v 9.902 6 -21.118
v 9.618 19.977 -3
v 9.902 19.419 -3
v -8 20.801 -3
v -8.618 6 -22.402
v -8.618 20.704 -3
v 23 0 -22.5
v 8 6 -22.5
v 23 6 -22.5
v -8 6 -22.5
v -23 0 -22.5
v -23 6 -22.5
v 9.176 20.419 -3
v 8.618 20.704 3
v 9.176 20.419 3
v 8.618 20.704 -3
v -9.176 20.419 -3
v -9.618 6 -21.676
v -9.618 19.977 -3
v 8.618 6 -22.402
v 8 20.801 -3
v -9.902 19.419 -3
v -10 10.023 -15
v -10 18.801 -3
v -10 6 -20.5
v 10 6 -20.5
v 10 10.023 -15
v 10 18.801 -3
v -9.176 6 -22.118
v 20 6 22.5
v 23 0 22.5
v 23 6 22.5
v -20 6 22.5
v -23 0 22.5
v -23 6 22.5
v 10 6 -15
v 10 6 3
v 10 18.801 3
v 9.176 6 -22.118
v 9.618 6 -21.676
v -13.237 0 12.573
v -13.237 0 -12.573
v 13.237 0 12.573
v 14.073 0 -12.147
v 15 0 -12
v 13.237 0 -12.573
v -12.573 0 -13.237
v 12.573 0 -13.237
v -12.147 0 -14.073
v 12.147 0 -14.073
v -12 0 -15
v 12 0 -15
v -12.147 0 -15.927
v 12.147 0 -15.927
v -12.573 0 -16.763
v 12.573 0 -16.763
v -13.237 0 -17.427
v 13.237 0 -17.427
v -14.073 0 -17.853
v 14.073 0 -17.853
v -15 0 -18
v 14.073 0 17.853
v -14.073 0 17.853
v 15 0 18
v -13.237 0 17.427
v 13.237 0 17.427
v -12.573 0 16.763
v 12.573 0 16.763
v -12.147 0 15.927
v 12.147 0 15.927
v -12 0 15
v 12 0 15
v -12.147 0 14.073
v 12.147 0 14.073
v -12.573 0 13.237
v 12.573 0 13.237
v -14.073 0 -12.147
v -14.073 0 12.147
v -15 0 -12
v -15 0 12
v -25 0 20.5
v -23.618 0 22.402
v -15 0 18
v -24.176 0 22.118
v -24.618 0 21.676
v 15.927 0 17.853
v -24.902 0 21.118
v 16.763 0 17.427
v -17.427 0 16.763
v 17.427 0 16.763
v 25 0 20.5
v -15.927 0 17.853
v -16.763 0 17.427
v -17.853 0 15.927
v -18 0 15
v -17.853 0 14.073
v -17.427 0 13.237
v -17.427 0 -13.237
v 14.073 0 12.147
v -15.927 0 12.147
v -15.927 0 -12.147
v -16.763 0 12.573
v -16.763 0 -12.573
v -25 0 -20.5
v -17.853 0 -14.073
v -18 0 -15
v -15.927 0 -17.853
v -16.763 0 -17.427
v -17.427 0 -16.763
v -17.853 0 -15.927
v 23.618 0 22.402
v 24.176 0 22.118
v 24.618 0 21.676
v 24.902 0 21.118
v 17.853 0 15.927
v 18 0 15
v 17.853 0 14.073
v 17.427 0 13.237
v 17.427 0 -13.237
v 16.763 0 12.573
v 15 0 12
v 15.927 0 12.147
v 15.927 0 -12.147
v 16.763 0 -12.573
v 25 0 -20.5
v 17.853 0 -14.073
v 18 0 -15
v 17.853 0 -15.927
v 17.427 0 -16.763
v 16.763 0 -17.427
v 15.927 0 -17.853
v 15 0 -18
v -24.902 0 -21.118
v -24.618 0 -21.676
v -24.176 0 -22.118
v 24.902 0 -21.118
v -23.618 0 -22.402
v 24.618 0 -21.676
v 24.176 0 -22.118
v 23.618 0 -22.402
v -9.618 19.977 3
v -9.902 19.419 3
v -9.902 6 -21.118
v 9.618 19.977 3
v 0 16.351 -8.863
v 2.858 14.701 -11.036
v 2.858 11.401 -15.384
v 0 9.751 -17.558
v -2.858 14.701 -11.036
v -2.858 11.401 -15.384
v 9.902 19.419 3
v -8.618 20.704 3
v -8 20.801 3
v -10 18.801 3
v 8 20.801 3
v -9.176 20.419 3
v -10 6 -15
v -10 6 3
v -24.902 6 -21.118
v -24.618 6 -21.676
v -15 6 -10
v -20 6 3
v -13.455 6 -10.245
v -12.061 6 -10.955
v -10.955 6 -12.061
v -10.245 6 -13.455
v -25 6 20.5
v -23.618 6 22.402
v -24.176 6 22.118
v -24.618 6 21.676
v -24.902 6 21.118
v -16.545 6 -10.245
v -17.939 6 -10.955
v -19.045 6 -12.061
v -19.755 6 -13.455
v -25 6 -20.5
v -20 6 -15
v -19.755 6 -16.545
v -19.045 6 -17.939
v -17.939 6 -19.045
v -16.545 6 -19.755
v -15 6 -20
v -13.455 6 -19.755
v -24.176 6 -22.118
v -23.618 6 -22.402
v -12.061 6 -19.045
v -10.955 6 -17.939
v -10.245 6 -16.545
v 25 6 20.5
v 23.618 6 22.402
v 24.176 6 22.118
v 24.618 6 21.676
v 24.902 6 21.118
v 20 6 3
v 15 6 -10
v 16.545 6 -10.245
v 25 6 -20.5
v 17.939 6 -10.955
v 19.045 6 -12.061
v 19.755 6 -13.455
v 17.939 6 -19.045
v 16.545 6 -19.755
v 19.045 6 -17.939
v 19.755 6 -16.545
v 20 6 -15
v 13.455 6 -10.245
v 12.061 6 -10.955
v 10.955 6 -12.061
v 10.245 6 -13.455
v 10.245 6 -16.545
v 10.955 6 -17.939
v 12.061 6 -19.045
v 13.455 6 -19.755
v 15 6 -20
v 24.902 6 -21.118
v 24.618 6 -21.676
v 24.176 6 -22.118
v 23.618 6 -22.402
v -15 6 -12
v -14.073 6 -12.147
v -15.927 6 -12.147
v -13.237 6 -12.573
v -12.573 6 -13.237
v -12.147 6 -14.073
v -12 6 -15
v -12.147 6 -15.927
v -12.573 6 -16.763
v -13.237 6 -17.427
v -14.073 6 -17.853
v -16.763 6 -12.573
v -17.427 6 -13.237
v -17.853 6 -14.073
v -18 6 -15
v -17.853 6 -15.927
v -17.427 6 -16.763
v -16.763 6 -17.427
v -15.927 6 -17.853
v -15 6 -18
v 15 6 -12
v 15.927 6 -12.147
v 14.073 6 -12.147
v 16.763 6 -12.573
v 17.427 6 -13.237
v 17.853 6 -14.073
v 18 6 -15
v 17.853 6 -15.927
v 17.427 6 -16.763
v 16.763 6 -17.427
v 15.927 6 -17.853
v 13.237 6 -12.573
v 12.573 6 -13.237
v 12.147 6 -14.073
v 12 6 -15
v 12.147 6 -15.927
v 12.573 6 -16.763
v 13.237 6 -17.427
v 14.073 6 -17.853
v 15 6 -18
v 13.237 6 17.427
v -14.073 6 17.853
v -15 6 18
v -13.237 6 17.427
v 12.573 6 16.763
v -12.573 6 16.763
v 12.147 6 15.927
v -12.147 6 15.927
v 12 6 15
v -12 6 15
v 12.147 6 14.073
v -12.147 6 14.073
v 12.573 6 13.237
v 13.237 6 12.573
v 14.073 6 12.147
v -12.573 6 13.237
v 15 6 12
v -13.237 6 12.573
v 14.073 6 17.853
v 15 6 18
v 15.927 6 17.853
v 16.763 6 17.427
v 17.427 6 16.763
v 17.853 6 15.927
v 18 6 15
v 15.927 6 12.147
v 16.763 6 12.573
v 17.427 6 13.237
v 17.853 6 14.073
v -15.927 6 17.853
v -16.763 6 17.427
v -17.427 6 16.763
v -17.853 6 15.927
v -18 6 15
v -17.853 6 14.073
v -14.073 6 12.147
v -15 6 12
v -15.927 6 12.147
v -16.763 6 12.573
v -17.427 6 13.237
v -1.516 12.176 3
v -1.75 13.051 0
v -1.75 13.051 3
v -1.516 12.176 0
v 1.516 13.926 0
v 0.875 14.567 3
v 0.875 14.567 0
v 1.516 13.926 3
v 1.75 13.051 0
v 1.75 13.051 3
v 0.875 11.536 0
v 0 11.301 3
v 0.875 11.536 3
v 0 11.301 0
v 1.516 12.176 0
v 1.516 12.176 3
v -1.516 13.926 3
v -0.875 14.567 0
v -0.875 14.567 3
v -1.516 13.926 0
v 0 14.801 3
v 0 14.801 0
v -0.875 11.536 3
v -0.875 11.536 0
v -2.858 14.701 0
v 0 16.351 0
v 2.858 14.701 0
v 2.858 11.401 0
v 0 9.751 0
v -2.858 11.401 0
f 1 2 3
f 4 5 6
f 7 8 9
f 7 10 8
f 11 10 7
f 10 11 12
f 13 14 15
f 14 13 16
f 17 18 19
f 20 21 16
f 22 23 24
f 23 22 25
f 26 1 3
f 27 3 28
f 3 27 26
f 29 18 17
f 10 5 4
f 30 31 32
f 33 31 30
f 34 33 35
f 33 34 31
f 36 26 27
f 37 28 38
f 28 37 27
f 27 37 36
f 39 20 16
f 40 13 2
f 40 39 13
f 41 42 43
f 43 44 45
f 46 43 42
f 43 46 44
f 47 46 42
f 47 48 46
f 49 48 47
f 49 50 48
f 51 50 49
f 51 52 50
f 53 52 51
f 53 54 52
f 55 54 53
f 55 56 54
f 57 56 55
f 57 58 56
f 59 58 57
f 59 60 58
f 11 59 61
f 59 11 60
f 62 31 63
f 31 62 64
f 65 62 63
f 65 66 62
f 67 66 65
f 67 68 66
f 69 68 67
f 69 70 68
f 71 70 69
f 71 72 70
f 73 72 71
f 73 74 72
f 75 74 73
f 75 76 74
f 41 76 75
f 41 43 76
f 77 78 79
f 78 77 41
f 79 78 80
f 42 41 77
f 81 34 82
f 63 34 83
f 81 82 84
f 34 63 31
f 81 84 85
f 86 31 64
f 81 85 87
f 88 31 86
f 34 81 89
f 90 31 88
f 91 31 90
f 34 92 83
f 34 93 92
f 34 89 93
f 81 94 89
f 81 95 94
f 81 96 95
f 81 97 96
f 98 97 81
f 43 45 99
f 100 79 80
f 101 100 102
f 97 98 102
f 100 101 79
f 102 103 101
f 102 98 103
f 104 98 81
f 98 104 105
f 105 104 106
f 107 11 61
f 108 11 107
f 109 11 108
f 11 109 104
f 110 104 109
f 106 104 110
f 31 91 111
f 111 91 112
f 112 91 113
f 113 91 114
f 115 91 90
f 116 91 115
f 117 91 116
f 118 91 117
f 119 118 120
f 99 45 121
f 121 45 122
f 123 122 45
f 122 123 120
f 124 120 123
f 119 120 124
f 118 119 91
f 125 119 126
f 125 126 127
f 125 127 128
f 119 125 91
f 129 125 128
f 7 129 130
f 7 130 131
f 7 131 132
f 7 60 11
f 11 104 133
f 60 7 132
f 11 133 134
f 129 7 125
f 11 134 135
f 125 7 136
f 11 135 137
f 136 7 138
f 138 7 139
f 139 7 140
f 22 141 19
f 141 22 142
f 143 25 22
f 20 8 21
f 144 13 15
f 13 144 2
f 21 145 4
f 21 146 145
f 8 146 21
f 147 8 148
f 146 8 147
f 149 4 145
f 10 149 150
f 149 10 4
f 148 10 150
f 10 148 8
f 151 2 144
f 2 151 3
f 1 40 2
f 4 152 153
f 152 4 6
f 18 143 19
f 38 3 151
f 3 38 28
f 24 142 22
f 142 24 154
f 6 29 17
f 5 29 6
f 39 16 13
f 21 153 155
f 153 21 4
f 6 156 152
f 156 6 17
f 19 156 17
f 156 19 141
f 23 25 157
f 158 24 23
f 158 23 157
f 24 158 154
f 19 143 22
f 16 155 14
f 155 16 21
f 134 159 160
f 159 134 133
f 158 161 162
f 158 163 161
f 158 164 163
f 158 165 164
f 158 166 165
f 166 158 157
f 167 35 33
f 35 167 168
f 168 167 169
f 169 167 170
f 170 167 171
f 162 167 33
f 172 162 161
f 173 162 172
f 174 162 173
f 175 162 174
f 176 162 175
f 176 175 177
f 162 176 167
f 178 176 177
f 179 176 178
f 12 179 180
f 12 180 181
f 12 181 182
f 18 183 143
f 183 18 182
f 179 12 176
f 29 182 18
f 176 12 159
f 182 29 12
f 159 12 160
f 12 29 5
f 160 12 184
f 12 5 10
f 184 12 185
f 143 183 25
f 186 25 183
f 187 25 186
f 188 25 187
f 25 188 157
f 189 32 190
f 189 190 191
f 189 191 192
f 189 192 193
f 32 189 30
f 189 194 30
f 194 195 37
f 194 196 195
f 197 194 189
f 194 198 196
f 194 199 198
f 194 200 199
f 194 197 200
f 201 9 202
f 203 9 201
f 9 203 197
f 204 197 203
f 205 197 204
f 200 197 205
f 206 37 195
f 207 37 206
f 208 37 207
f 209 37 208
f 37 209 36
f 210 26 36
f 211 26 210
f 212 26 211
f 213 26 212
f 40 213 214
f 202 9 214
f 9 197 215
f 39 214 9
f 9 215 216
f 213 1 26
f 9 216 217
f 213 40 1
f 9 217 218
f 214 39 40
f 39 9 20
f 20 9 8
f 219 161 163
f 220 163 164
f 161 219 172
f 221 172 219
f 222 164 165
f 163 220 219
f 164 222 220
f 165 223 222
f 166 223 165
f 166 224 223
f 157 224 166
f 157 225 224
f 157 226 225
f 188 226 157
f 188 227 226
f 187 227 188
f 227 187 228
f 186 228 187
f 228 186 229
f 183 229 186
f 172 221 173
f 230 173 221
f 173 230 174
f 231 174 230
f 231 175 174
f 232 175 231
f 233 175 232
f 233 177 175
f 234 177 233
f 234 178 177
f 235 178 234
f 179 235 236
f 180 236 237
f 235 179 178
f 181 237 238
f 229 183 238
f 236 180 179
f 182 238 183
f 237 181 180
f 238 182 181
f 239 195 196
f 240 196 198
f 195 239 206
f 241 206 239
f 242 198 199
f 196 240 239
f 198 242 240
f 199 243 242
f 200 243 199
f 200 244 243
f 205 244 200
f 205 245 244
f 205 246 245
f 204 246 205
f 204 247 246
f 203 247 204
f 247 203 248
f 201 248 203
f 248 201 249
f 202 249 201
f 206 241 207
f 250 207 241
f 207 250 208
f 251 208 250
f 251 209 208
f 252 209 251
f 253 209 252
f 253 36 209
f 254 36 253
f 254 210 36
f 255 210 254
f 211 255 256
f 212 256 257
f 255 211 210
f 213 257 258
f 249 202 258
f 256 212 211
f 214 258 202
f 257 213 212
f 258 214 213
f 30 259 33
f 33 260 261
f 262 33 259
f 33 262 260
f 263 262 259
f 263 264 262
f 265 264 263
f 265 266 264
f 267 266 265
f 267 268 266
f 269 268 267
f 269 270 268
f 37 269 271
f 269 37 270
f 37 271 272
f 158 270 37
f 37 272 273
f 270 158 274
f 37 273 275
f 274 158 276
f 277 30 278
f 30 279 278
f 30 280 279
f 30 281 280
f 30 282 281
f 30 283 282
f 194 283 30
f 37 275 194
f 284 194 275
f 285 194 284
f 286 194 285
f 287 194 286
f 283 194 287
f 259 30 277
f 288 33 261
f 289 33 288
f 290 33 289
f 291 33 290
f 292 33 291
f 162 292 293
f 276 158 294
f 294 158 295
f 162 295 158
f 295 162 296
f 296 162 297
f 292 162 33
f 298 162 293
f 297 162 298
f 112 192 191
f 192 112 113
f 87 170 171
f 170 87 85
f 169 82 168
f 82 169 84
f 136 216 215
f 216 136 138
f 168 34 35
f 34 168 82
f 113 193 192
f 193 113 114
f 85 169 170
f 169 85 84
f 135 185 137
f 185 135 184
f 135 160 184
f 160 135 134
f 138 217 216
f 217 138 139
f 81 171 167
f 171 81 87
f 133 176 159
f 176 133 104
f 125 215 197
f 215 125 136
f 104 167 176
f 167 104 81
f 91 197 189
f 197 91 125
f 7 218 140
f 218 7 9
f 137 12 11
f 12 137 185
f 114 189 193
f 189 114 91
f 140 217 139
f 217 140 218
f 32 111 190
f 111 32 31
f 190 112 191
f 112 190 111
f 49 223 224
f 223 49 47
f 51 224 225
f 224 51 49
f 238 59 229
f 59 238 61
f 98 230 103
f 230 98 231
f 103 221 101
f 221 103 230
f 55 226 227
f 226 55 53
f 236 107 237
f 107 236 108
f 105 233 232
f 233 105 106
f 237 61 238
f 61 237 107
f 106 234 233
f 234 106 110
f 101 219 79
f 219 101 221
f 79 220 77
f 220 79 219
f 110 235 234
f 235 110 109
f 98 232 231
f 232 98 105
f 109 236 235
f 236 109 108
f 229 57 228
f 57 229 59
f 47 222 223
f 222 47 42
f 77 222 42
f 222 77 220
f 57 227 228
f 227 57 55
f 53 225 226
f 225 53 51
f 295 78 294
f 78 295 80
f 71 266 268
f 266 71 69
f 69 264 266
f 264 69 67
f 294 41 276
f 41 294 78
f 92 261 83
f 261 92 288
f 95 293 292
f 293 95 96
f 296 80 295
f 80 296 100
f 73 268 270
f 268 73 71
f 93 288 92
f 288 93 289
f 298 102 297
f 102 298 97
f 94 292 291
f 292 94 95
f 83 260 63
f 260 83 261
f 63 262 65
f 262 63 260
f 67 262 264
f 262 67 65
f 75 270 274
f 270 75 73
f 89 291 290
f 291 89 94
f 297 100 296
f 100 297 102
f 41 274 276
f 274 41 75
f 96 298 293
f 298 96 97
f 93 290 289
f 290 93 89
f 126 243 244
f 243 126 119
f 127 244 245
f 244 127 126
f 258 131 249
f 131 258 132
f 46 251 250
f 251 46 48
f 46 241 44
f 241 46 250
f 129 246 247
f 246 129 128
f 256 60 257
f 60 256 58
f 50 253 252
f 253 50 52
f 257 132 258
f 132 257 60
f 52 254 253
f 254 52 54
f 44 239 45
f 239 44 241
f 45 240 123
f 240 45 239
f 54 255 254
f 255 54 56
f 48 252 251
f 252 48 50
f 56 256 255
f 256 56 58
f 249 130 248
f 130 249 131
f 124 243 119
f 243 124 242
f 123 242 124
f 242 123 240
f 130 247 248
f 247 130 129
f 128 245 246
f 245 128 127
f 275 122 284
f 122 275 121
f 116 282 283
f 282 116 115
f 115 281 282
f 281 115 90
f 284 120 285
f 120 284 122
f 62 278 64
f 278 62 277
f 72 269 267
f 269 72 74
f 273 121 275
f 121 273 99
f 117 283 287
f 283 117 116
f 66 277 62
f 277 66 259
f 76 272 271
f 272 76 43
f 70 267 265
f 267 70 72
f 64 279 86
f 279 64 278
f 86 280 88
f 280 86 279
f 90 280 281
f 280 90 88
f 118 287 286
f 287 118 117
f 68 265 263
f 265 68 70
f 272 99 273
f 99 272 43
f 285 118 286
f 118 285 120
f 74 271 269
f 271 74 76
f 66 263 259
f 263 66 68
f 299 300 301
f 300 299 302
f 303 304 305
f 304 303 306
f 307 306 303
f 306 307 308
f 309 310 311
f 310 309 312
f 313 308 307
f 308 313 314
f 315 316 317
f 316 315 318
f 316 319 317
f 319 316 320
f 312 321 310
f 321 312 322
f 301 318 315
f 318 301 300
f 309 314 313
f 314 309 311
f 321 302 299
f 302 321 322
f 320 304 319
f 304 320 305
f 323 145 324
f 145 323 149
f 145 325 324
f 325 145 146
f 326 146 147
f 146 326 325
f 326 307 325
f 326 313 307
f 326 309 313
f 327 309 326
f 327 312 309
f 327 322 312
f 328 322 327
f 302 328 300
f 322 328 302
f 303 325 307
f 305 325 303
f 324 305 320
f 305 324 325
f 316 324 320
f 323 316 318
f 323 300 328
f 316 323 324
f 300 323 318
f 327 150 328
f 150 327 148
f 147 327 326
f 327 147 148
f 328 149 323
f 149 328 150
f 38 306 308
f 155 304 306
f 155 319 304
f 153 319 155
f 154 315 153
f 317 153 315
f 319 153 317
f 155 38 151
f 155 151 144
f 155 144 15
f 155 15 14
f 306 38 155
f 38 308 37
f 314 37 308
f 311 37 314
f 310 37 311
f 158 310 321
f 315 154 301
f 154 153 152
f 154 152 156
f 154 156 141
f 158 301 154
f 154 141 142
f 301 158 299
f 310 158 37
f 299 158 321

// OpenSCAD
// file: config.scad
//triangular vertex peices
$fa=1;
$fs=1;
ep=0.01;
//parametrics
//cutout for the AL extrusions, with 2 opposite tracks having an inset
//tweaked from ideal to satisfy printing limits
side=20;    //size of a side of the extrusion
slot=6-.4;     //width of the slots, on the face
central=8+1;  //how wide the central pillar is; the slot depth is then (side-central)/2
//corner radius
vertex_rad=40;
//distance from edge to vertical 2020 shaft
vert_inset=6;
//thickness of the wall on the inside of the triangle
inside_wall_thick=6;
//belt channel width
channel_width=26;
//lenght of plastic alongside in-plane extrusion
wing_length=70;
//height of the frame piece
piece_h=50;
//mounting hardware
m5_slot=6;
m5_head=10; //diameter of M5 head
m5_wall=5; //thickness of plastic between M5 and extrusion
//m3 sizing
m3_slot=3.5;
module 2020_cutout_two()
{
    ss=side+.8; //printer tolerance
    difference()
    {
        //main body
        square([ss,ss],center=true);
        //track slots
        translate([ss/2+central/2,0])square([ss,slot],center=true);
        translate([-(ss/2+central/2),0])square([ss,slot],center=true);
        translate([0,(ss/2+central/2)])square([slot,ss],center=true);
    }
}
module nut_fill()
{
    nut_w=10.5+1;
    nut_w_b=6.5+1.5;
    nut_depth=(side-central)/2;
    //spaces for inserting the t slot nuts
    //translate([0,0,-nut_depth/2])
    hull()
    {
        cube([nut_w+3,nut_w*2,ep],center=true);
        translate([0,0,-nut_depth])cube([nut_w_b,nut_w*2,ep],center=true);
    }
    //cube([nut_w,nut_w*2,nut_depth],center=true);
}
module base_shape()
{
    difference()
    {
        union()
        {
            //rounded vertex
            circle(r=vertex_rad,center=true);
            //'wings' along in plane extrusion lengths
            rotate([0,0,60])translate([-side+vertex_rad-inside_wall_thick*2,wing_length/2])square([inside_wall_thick*4,wing_length],center=true); 
            rotate([0,0,-60])translate([-side+vertex_rad-inside_wall_thick*2,-wing_length/2])square([inside_wall_thick*4,wing_length],center=true); 
        }
        //in plane extrusions
        rotate([0,0,60])translate([-side/2+vertex_rad,vertex_rad/2])square([side,vertex_rad],center=true);
        rotate([0,0,-60])translate([-side/2+vertex_rad,-vertex_rad/2])square([side,vertex_rad],center=true);
        //vertical extrusion
        translate([(-side/2)+vertex_rad-vert_inset,0,0])rotate([0,0,90])2020_cutout_two();
        //opening for belts or motor
        motor_gap();
        //any remaining portion of hte circle we want removed
        open_inside();
    }
}
module motor_gap()
{
    //create rough triangle of unneeded area
    round=2;
    xx=-side-inside_wall_thick-round;
    qq=-(channel_width)/2+vertex_rad-vert_inset-side-inside_wall_thick;
    //make round
    minkowski()
    {
        intersection()
        {
            rotate([0,0,60])translate([xx,0])square([vertex_rad*2,vertex_rad*4],center=true);
            rotate([0,0,-60])translate([xx,0])square([vertex_rad*2,vertex_rad*4],center=true);
            translate([qq,0])square([channel_width-round*2,vertex_rad*2],center=true);
        }
        circle(r=round+0.01,$fn=40);
    }
}
module open_inside()
{
    //rest of interior
    //create rough triangle of unneeded area
    round=2;
    xx=-side-inside_wall_thick-round;
    qq=-side-inside_wall_thick-vert_inset-channel_width-inside_wall_thick;
    //make round
    minkowski()
    {
        intersection()
        {
            rotate([0,0,60])translate([xx,wing_length])square([vertex_rad*2,vertex_rad*4+wing_length],center=true);
            rotate([0,0,-60])translate([xx,-wing_length])square([vertex_rad*2,vertex_rad*4+wing_length],center=true);
            translate([qq,0])square([vertex_rad*2-round*2,vertex_rad*2+wing_length],center=true);
        }
        circle(r=round+0.01,$fn=40);
    }
}
// main file
pcb_d=215;
screw_inset=5.0;
base_ext_l=331;

include <config.scad>;
m3nut_r=6.6/2;
virt_r=((base_ext_l)/2)/(sqrt(3));
//center to inside frame edge
center_to_edge=(virt_r+(vertex_rad-side));
echo(center_to_edge);
//frame edge to the center of the support screw
edge_to_screw=center_to_edge-(pcb_d/2)+screw_inset;
echo(edge_to_screw);

mount_gap=piece_h-side; //half a side in from top and bottom

round=2;

difference()
{
    bracket();
    mount_holes();
    mount_clearance();
}

module mount_holes()
{
    //m5 bolts
    for (bb=[-.5:1:.5])
    {
        translate([bb*mount_gap,0,0])
        {
            for (aa=[-.5:1:.5])
            {
                translate([0,0,mount_gap*aa])rotate([90,0,0])cylinder(r=m5_slot/2,h=50,$fn=20,center=true);
            }
            translate([0,25+inside_wall_thick,mount_gap*-.5])rotate([90,0,0])cylinder(r=m5_head/2,h=50,$fn=20,center=true);
        }
    }
    //m3 screw
    translate([0,edge_to_screw,0])cylinder(r=m3_slot/2,h=50,$fn=12,center=true);
    //hex trap
    translate([0,edge_to_screw,-25])rotate([0,0,30])cylinder(r=m3nut_r,h=50,$fn=6,center=true);
}

module mount_clearance()
{
    translate([0,mount_gap+inside_wall_thick,piece_h/2+inside_wall_thick/2])cube([side*2,mount_gap*2,piece_h],center=true);
}

module bracket()
{
    y_l=edge_to_screw+inside_wall_thick+m3_slot/2;
    hull()
    {
        translate([0,inside_wall_thick,0])rotate([90,0,0])linear_extrude(height=inside_wall_thick)minkowski()
        {
            square([side-round*2,(piece_h-5)-round*2],center=true);
            //cube([side,inside_wall_thick,piece_h-5],center=true);
            circle(r=round,$fn=20);
        }
        translate([0,y_l/2,-inside_wall_thick/2])linear_extrude(inside_wall_thick)minkowski()
        {
            square([side-round*2,y_l-round*2],center=true);
            //cube([side,y_l,inside_wall_thick],center=true);
            circle(r=round,$fn=20);
        }
    }
    translate([0,inside_wall_thick,0])rotate([90,0,0])linear_extrude(height=inside_wall_thick)minkowski()
    {
        square([mount_gap+side-round*2,(piece_h-5)-round*2],center=true);
        //cube([side,inside_wall_thick,piece_h-5],center=true);
        circle(r=round,$fn=20);
    }
}
